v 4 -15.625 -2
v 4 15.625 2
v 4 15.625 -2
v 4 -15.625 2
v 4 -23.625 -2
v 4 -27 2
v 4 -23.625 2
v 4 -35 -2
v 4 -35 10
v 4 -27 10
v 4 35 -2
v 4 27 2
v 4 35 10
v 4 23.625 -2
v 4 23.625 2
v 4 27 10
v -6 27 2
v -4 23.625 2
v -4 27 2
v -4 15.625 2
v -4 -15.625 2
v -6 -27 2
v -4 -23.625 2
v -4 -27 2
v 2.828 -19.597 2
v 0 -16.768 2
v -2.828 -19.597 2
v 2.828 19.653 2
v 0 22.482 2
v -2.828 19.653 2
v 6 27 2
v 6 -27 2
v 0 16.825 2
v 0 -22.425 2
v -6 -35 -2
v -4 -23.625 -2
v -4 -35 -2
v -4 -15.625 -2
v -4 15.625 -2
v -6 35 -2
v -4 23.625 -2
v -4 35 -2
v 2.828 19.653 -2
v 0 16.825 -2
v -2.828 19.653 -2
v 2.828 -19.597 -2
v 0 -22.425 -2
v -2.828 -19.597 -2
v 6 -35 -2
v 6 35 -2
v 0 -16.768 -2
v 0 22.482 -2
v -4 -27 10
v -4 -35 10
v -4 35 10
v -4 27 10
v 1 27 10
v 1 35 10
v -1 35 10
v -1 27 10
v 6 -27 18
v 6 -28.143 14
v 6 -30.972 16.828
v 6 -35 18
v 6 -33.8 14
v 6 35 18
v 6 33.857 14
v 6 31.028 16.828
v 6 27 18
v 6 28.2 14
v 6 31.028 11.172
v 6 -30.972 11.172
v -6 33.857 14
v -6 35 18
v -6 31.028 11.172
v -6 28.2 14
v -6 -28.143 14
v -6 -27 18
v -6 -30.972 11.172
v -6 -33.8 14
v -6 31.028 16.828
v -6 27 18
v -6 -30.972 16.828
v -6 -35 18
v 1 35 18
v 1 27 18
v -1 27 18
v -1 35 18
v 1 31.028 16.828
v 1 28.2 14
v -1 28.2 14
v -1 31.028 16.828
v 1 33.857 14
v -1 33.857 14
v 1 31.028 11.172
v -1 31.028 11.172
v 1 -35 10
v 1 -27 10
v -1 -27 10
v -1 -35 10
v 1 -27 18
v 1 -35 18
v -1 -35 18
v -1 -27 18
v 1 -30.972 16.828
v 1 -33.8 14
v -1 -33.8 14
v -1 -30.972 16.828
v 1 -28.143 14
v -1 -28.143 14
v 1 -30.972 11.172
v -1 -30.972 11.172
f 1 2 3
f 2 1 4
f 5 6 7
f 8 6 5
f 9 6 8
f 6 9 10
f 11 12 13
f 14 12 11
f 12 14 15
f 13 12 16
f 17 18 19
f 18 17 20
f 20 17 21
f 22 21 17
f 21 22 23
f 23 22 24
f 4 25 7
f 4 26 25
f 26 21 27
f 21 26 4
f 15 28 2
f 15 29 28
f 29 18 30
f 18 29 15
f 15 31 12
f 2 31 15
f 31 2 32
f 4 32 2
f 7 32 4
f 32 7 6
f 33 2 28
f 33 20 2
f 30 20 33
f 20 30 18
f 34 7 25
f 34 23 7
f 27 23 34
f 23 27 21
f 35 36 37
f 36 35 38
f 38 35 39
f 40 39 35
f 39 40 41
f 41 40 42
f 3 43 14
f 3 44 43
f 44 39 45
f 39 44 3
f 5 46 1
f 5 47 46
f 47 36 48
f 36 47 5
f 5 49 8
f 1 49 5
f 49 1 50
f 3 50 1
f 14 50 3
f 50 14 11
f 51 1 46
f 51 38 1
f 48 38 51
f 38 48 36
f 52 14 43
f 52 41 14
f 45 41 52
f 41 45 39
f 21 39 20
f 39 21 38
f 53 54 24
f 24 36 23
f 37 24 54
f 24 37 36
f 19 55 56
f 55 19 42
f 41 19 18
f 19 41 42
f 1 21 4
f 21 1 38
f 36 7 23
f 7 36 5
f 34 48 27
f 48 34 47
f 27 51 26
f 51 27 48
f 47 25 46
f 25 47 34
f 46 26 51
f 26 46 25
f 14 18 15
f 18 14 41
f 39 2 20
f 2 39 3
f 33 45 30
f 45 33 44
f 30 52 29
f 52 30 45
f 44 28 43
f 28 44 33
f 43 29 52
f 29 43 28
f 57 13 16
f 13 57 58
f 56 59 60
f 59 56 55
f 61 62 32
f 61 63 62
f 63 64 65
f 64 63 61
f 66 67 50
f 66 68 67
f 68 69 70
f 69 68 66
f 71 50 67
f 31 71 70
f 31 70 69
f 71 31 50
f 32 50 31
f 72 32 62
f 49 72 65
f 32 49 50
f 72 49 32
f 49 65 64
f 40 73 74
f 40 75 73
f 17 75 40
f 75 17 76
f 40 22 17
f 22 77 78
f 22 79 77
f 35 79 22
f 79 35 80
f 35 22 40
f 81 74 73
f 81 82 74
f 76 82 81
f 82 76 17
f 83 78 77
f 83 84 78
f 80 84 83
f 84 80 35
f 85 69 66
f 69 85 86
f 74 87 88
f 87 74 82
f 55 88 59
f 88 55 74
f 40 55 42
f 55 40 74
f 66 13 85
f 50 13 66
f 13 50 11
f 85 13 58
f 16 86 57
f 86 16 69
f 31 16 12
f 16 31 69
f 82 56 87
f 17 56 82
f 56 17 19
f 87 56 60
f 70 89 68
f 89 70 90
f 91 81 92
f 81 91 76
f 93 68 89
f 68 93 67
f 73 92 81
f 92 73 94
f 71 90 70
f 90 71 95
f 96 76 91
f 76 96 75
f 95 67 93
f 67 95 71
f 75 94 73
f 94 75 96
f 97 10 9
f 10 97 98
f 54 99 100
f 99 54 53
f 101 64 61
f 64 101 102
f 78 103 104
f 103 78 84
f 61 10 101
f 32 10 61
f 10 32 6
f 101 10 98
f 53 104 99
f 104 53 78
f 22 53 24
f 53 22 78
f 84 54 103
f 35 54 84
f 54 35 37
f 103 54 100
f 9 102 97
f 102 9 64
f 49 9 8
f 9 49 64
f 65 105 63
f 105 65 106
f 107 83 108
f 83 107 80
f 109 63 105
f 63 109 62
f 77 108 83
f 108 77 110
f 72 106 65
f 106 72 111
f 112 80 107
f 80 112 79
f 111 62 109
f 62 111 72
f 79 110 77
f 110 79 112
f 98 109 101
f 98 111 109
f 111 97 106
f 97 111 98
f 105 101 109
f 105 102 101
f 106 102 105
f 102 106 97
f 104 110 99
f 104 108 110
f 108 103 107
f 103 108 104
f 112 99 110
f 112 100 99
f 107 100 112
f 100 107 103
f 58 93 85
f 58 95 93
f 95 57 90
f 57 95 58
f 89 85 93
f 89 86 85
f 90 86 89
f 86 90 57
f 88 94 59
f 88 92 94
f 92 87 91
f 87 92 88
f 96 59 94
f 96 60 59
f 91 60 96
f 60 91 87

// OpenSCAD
$fn = 100;
screw_thickness = 2;
screw_height = 4;
mount_screw_d = 4;
mount_y_size = 39.25;
plate_x_size = 2;
plate_y_size = 70;
sensor_height = 10;

module screw_hole(x, y, z, screw_r=mount_screw_d / 2, wall_r=screw_thickness, height=screw_height)
{
    difference()
    {
        translate([x - (screw_r + wall_r), y - (screw_r + wall_r), z - height / 2])
        cube([2 * (screw_r + wall_r), 2 * (screw_r + wall_r), height], center=false);

        translate([x, y - 1.4 * screw_r, z - height], center=false)
        rotate([0, 0, 45])
        cube([2 * screw_r, 2 * screw_r, 2 * height], center=false);
    }
}

// left mount screw
screw_hole(0, -mount_y_size / 2, 0,
    height=screw_height,
    screw_r=mount_screw_d/2);

// right mount screw
screw_hole(0, mount_y_size / 2, 0,
    height=screw_height,
    screw_r=mount_screw_d/2);

difference()
{
    union()
    {
        // back plate
        translate([-mount_screw_d - screw_thickness, -plate_y_size / 2, -screw_height / 2])
        cube([plate_x_size, plate_y_size, screw_height], center=false);

        // front plate
        translate([mount_screw_d, -plate_y_size / 2, -screw_height / 2])
        cube([plate_x_size, plate_y_size, screw_height], center=false);

        // left top sensor grip
        translate([mount_screw_d, plate_y_size / 2 - mount_screw_d - 2 * screw_thickness, 0])
        cube([plate_x_size, mount_screw_d + 2 * screw_thickness, sensor_height], center=false);

        // left bottom sensor grip
        translate([-mount_screw_d - screw_thickness, plate_y_size / 2 - mount_screw_d - 2 * screw_thickness, 0])
        cube([plate_x_size, mount_screw_d + 2 * screw_thickness, sensor_height], center=false);

        // right top sensor grip
        translate([mount_screw_d, -plate_y_size / 2, 0])
        cube([plate_x_size, mount_screw_d + 2 * screw_thickness, sensor_height], center=false);

        // right bottom sensor grip
        translate([-mount_screw_d - screw_thickness, -plate_y_size / 2, 0])
        cube([plate_x_size, mount_screw_d + 2 * screw_thickness, sensor_height], center=false);

        // top left sensor screw hole
        translate([mount_screw_d + plate_x_size / 2, 0, sensor_height + mount_screw_d])
        rotate([0, 90, 0])
        screw_hole(0, plate_y_size / 2 - mount_screw_d, -5,
            height=12,
            screw_r=mount_screw_d/2);

        translate([mount_screw_d + plate_x_size / 2, 0, sensor_height + mount_screw_d])
        rotate([0, 90, 0])
        screw_hole(0, -plate_y_size / 2 + mount_screw_d, -5,
            height=12,
            screw_r=mount_screw_d/2);
        }

        translate([-1, -plate_y_size / 2 + mount_screw_d / 2 - screw_thickness - 2, sensor_height - 2])
        cube([2, 4 + mount_screw_d + 2 * screw_thickness, 4 + mount_screw_d + 2 * screw_thickness], center=false);

        translate([-1, plate_y_size / 2 - mount_screw_d / 2 - screw_thickness - 6, sensor_height - 2])
        cube([2, 4 + mount_screw_d + 2 * screw_thickness, 4 + mount_screw_d + 2 * screw_thickness], center=false);

}
